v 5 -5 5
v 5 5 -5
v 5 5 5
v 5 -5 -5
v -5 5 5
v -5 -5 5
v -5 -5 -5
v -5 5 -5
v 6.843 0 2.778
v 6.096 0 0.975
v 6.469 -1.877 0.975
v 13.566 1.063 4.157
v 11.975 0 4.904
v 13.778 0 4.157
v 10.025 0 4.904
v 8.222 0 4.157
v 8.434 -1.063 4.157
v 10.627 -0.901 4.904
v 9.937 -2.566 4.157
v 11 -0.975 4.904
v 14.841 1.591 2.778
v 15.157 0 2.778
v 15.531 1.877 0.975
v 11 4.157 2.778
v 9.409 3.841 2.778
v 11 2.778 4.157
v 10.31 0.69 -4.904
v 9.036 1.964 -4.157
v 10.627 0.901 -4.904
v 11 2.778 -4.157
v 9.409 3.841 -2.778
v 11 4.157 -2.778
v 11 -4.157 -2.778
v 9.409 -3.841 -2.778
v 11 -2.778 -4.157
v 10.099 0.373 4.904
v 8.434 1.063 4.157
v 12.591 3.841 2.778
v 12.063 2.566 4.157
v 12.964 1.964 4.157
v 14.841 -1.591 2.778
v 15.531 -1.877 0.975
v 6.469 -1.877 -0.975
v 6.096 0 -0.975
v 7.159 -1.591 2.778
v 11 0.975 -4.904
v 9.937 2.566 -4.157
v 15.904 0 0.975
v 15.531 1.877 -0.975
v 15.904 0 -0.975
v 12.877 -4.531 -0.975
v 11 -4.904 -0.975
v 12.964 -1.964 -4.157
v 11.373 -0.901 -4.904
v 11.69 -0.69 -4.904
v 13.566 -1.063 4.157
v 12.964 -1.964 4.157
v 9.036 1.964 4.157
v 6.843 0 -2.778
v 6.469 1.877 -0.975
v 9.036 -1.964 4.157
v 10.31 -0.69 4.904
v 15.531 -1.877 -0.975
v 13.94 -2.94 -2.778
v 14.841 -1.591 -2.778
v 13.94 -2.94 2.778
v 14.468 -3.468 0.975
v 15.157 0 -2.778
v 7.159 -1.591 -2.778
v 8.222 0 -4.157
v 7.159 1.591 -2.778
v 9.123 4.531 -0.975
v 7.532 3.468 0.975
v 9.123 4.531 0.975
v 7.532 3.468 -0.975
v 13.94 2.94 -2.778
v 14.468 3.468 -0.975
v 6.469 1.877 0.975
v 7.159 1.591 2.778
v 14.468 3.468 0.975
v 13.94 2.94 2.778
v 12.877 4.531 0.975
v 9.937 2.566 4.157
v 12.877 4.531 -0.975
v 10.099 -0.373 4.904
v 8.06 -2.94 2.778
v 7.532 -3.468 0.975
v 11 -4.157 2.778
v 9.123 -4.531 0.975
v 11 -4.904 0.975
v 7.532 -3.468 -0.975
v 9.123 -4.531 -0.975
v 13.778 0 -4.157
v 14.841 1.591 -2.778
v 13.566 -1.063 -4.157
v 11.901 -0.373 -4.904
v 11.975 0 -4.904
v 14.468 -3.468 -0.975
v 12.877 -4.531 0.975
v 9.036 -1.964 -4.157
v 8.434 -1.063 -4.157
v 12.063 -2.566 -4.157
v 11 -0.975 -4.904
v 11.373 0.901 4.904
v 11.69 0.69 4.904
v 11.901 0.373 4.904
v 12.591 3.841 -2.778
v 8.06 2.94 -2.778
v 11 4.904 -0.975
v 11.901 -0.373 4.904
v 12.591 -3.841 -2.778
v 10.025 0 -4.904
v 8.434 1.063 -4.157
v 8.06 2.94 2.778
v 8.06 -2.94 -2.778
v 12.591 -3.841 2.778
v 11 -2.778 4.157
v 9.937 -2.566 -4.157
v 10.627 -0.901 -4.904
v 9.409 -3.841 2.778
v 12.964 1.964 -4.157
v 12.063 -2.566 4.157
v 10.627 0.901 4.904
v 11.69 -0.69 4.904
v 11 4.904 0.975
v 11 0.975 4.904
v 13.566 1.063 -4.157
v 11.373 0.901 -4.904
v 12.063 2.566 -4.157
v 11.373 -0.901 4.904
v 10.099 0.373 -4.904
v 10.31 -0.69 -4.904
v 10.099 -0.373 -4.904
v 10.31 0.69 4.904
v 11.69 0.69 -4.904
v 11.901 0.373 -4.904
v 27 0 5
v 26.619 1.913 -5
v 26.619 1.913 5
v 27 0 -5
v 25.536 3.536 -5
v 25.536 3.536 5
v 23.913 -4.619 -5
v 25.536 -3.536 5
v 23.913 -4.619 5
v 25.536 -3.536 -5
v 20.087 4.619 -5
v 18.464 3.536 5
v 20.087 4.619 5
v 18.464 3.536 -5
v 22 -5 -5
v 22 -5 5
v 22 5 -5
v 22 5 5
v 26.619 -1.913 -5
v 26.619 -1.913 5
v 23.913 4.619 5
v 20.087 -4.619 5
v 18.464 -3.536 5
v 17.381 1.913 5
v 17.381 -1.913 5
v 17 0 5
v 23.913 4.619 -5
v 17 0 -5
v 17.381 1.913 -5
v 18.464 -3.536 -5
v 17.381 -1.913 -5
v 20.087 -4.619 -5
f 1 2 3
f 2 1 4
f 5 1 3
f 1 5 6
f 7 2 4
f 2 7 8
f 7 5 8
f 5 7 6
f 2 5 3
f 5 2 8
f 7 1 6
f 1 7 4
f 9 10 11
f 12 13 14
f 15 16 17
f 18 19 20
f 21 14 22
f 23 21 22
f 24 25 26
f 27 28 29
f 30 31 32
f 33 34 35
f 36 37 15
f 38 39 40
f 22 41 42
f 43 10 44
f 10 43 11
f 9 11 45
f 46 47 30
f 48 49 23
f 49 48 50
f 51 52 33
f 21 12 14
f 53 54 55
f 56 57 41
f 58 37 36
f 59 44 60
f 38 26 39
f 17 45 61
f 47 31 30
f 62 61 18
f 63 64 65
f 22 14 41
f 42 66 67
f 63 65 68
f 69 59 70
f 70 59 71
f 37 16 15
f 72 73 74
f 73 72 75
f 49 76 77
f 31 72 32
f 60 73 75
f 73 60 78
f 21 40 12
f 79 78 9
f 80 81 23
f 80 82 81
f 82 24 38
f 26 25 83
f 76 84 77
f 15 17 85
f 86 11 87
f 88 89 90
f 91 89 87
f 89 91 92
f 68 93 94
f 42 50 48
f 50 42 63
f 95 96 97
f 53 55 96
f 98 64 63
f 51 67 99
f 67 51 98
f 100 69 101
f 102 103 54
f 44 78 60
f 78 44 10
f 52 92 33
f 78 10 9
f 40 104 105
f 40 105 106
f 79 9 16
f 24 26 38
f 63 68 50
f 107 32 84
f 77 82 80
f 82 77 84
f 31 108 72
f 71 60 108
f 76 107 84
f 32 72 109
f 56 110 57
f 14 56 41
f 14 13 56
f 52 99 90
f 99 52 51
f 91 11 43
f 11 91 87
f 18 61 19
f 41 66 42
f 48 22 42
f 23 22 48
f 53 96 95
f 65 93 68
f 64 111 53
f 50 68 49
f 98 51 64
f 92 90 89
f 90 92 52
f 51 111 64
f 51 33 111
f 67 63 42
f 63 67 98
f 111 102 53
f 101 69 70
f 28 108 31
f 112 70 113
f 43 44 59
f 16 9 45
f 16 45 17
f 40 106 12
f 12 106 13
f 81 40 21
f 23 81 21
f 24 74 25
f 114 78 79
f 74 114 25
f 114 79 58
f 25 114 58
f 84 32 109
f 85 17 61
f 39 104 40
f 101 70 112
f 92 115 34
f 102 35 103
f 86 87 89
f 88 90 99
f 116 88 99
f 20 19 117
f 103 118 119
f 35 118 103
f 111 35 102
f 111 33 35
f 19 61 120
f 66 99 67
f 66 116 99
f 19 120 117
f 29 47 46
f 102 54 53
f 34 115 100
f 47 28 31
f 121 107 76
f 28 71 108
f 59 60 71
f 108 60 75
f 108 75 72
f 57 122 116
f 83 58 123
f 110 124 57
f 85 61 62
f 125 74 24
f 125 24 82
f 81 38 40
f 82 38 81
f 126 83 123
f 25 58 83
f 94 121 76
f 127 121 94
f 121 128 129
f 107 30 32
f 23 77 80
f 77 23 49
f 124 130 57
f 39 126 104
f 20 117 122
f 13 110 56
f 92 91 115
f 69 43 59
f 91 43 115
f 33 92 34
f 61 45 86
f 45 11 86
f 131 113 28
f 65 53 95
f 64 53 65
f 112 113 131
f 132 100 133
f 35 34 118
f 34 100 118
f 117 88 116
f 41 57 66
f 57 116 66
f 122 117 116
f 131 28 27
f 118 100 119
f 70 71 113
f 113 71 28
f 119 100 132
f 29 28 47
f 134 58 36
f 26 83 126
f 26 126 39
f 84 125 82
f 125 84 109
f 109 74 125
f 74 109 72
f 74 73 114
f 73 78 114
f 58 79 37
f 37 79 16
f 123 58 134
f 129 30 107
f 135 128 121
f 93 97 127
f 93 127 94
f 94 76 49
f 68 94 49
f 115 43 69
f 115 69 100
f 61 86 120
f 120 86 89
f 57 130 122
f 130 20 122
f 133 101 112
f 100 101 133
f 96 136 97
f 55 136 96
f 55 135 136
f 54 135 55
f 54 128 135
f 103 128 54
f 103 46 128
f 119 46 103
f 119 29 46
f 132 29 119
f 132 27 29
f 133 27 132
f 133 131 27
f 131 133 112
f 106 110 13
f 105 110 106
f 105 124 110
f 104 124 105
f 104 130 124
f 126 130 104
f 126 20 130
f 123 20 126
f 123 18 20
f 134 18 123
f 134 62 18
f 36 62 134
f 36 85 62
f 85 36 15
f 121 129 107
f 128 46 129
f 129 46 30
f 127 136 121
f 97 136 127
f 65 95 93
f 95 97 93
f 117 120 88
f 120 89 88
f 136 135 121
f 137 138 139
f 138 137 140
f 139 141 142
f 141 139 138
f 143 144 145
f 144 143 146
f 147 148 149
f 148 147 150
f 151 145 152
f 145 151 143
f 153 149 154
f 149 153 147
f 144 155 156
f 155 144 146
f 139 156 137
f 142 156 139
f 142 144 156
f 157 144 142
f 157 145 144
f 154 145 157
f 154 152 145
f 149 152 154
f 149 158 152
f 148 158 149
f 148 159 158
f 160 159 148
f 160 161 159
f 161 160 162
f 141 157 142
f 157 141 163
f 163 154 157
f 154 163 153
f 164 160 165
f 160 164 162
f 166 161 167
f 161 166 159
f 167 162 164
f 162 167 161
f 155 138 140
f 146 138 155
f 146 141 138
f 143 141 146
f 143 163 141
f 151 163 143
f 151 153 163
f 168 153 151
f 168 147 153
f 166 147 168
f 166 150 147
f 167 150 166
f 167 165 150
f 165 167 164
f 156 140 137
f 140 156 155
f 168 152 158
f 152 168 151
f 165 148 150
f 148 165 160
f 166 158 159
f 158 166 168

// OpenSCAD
module LazyChildrenTest() {
  children();
}

LazyChildrenTest() {
  cube(10, center=true);
  translate([11,0,0]) sphere(5);
  translate([22,0,0]) cylinder(r=5, h=10, center=true);
}
